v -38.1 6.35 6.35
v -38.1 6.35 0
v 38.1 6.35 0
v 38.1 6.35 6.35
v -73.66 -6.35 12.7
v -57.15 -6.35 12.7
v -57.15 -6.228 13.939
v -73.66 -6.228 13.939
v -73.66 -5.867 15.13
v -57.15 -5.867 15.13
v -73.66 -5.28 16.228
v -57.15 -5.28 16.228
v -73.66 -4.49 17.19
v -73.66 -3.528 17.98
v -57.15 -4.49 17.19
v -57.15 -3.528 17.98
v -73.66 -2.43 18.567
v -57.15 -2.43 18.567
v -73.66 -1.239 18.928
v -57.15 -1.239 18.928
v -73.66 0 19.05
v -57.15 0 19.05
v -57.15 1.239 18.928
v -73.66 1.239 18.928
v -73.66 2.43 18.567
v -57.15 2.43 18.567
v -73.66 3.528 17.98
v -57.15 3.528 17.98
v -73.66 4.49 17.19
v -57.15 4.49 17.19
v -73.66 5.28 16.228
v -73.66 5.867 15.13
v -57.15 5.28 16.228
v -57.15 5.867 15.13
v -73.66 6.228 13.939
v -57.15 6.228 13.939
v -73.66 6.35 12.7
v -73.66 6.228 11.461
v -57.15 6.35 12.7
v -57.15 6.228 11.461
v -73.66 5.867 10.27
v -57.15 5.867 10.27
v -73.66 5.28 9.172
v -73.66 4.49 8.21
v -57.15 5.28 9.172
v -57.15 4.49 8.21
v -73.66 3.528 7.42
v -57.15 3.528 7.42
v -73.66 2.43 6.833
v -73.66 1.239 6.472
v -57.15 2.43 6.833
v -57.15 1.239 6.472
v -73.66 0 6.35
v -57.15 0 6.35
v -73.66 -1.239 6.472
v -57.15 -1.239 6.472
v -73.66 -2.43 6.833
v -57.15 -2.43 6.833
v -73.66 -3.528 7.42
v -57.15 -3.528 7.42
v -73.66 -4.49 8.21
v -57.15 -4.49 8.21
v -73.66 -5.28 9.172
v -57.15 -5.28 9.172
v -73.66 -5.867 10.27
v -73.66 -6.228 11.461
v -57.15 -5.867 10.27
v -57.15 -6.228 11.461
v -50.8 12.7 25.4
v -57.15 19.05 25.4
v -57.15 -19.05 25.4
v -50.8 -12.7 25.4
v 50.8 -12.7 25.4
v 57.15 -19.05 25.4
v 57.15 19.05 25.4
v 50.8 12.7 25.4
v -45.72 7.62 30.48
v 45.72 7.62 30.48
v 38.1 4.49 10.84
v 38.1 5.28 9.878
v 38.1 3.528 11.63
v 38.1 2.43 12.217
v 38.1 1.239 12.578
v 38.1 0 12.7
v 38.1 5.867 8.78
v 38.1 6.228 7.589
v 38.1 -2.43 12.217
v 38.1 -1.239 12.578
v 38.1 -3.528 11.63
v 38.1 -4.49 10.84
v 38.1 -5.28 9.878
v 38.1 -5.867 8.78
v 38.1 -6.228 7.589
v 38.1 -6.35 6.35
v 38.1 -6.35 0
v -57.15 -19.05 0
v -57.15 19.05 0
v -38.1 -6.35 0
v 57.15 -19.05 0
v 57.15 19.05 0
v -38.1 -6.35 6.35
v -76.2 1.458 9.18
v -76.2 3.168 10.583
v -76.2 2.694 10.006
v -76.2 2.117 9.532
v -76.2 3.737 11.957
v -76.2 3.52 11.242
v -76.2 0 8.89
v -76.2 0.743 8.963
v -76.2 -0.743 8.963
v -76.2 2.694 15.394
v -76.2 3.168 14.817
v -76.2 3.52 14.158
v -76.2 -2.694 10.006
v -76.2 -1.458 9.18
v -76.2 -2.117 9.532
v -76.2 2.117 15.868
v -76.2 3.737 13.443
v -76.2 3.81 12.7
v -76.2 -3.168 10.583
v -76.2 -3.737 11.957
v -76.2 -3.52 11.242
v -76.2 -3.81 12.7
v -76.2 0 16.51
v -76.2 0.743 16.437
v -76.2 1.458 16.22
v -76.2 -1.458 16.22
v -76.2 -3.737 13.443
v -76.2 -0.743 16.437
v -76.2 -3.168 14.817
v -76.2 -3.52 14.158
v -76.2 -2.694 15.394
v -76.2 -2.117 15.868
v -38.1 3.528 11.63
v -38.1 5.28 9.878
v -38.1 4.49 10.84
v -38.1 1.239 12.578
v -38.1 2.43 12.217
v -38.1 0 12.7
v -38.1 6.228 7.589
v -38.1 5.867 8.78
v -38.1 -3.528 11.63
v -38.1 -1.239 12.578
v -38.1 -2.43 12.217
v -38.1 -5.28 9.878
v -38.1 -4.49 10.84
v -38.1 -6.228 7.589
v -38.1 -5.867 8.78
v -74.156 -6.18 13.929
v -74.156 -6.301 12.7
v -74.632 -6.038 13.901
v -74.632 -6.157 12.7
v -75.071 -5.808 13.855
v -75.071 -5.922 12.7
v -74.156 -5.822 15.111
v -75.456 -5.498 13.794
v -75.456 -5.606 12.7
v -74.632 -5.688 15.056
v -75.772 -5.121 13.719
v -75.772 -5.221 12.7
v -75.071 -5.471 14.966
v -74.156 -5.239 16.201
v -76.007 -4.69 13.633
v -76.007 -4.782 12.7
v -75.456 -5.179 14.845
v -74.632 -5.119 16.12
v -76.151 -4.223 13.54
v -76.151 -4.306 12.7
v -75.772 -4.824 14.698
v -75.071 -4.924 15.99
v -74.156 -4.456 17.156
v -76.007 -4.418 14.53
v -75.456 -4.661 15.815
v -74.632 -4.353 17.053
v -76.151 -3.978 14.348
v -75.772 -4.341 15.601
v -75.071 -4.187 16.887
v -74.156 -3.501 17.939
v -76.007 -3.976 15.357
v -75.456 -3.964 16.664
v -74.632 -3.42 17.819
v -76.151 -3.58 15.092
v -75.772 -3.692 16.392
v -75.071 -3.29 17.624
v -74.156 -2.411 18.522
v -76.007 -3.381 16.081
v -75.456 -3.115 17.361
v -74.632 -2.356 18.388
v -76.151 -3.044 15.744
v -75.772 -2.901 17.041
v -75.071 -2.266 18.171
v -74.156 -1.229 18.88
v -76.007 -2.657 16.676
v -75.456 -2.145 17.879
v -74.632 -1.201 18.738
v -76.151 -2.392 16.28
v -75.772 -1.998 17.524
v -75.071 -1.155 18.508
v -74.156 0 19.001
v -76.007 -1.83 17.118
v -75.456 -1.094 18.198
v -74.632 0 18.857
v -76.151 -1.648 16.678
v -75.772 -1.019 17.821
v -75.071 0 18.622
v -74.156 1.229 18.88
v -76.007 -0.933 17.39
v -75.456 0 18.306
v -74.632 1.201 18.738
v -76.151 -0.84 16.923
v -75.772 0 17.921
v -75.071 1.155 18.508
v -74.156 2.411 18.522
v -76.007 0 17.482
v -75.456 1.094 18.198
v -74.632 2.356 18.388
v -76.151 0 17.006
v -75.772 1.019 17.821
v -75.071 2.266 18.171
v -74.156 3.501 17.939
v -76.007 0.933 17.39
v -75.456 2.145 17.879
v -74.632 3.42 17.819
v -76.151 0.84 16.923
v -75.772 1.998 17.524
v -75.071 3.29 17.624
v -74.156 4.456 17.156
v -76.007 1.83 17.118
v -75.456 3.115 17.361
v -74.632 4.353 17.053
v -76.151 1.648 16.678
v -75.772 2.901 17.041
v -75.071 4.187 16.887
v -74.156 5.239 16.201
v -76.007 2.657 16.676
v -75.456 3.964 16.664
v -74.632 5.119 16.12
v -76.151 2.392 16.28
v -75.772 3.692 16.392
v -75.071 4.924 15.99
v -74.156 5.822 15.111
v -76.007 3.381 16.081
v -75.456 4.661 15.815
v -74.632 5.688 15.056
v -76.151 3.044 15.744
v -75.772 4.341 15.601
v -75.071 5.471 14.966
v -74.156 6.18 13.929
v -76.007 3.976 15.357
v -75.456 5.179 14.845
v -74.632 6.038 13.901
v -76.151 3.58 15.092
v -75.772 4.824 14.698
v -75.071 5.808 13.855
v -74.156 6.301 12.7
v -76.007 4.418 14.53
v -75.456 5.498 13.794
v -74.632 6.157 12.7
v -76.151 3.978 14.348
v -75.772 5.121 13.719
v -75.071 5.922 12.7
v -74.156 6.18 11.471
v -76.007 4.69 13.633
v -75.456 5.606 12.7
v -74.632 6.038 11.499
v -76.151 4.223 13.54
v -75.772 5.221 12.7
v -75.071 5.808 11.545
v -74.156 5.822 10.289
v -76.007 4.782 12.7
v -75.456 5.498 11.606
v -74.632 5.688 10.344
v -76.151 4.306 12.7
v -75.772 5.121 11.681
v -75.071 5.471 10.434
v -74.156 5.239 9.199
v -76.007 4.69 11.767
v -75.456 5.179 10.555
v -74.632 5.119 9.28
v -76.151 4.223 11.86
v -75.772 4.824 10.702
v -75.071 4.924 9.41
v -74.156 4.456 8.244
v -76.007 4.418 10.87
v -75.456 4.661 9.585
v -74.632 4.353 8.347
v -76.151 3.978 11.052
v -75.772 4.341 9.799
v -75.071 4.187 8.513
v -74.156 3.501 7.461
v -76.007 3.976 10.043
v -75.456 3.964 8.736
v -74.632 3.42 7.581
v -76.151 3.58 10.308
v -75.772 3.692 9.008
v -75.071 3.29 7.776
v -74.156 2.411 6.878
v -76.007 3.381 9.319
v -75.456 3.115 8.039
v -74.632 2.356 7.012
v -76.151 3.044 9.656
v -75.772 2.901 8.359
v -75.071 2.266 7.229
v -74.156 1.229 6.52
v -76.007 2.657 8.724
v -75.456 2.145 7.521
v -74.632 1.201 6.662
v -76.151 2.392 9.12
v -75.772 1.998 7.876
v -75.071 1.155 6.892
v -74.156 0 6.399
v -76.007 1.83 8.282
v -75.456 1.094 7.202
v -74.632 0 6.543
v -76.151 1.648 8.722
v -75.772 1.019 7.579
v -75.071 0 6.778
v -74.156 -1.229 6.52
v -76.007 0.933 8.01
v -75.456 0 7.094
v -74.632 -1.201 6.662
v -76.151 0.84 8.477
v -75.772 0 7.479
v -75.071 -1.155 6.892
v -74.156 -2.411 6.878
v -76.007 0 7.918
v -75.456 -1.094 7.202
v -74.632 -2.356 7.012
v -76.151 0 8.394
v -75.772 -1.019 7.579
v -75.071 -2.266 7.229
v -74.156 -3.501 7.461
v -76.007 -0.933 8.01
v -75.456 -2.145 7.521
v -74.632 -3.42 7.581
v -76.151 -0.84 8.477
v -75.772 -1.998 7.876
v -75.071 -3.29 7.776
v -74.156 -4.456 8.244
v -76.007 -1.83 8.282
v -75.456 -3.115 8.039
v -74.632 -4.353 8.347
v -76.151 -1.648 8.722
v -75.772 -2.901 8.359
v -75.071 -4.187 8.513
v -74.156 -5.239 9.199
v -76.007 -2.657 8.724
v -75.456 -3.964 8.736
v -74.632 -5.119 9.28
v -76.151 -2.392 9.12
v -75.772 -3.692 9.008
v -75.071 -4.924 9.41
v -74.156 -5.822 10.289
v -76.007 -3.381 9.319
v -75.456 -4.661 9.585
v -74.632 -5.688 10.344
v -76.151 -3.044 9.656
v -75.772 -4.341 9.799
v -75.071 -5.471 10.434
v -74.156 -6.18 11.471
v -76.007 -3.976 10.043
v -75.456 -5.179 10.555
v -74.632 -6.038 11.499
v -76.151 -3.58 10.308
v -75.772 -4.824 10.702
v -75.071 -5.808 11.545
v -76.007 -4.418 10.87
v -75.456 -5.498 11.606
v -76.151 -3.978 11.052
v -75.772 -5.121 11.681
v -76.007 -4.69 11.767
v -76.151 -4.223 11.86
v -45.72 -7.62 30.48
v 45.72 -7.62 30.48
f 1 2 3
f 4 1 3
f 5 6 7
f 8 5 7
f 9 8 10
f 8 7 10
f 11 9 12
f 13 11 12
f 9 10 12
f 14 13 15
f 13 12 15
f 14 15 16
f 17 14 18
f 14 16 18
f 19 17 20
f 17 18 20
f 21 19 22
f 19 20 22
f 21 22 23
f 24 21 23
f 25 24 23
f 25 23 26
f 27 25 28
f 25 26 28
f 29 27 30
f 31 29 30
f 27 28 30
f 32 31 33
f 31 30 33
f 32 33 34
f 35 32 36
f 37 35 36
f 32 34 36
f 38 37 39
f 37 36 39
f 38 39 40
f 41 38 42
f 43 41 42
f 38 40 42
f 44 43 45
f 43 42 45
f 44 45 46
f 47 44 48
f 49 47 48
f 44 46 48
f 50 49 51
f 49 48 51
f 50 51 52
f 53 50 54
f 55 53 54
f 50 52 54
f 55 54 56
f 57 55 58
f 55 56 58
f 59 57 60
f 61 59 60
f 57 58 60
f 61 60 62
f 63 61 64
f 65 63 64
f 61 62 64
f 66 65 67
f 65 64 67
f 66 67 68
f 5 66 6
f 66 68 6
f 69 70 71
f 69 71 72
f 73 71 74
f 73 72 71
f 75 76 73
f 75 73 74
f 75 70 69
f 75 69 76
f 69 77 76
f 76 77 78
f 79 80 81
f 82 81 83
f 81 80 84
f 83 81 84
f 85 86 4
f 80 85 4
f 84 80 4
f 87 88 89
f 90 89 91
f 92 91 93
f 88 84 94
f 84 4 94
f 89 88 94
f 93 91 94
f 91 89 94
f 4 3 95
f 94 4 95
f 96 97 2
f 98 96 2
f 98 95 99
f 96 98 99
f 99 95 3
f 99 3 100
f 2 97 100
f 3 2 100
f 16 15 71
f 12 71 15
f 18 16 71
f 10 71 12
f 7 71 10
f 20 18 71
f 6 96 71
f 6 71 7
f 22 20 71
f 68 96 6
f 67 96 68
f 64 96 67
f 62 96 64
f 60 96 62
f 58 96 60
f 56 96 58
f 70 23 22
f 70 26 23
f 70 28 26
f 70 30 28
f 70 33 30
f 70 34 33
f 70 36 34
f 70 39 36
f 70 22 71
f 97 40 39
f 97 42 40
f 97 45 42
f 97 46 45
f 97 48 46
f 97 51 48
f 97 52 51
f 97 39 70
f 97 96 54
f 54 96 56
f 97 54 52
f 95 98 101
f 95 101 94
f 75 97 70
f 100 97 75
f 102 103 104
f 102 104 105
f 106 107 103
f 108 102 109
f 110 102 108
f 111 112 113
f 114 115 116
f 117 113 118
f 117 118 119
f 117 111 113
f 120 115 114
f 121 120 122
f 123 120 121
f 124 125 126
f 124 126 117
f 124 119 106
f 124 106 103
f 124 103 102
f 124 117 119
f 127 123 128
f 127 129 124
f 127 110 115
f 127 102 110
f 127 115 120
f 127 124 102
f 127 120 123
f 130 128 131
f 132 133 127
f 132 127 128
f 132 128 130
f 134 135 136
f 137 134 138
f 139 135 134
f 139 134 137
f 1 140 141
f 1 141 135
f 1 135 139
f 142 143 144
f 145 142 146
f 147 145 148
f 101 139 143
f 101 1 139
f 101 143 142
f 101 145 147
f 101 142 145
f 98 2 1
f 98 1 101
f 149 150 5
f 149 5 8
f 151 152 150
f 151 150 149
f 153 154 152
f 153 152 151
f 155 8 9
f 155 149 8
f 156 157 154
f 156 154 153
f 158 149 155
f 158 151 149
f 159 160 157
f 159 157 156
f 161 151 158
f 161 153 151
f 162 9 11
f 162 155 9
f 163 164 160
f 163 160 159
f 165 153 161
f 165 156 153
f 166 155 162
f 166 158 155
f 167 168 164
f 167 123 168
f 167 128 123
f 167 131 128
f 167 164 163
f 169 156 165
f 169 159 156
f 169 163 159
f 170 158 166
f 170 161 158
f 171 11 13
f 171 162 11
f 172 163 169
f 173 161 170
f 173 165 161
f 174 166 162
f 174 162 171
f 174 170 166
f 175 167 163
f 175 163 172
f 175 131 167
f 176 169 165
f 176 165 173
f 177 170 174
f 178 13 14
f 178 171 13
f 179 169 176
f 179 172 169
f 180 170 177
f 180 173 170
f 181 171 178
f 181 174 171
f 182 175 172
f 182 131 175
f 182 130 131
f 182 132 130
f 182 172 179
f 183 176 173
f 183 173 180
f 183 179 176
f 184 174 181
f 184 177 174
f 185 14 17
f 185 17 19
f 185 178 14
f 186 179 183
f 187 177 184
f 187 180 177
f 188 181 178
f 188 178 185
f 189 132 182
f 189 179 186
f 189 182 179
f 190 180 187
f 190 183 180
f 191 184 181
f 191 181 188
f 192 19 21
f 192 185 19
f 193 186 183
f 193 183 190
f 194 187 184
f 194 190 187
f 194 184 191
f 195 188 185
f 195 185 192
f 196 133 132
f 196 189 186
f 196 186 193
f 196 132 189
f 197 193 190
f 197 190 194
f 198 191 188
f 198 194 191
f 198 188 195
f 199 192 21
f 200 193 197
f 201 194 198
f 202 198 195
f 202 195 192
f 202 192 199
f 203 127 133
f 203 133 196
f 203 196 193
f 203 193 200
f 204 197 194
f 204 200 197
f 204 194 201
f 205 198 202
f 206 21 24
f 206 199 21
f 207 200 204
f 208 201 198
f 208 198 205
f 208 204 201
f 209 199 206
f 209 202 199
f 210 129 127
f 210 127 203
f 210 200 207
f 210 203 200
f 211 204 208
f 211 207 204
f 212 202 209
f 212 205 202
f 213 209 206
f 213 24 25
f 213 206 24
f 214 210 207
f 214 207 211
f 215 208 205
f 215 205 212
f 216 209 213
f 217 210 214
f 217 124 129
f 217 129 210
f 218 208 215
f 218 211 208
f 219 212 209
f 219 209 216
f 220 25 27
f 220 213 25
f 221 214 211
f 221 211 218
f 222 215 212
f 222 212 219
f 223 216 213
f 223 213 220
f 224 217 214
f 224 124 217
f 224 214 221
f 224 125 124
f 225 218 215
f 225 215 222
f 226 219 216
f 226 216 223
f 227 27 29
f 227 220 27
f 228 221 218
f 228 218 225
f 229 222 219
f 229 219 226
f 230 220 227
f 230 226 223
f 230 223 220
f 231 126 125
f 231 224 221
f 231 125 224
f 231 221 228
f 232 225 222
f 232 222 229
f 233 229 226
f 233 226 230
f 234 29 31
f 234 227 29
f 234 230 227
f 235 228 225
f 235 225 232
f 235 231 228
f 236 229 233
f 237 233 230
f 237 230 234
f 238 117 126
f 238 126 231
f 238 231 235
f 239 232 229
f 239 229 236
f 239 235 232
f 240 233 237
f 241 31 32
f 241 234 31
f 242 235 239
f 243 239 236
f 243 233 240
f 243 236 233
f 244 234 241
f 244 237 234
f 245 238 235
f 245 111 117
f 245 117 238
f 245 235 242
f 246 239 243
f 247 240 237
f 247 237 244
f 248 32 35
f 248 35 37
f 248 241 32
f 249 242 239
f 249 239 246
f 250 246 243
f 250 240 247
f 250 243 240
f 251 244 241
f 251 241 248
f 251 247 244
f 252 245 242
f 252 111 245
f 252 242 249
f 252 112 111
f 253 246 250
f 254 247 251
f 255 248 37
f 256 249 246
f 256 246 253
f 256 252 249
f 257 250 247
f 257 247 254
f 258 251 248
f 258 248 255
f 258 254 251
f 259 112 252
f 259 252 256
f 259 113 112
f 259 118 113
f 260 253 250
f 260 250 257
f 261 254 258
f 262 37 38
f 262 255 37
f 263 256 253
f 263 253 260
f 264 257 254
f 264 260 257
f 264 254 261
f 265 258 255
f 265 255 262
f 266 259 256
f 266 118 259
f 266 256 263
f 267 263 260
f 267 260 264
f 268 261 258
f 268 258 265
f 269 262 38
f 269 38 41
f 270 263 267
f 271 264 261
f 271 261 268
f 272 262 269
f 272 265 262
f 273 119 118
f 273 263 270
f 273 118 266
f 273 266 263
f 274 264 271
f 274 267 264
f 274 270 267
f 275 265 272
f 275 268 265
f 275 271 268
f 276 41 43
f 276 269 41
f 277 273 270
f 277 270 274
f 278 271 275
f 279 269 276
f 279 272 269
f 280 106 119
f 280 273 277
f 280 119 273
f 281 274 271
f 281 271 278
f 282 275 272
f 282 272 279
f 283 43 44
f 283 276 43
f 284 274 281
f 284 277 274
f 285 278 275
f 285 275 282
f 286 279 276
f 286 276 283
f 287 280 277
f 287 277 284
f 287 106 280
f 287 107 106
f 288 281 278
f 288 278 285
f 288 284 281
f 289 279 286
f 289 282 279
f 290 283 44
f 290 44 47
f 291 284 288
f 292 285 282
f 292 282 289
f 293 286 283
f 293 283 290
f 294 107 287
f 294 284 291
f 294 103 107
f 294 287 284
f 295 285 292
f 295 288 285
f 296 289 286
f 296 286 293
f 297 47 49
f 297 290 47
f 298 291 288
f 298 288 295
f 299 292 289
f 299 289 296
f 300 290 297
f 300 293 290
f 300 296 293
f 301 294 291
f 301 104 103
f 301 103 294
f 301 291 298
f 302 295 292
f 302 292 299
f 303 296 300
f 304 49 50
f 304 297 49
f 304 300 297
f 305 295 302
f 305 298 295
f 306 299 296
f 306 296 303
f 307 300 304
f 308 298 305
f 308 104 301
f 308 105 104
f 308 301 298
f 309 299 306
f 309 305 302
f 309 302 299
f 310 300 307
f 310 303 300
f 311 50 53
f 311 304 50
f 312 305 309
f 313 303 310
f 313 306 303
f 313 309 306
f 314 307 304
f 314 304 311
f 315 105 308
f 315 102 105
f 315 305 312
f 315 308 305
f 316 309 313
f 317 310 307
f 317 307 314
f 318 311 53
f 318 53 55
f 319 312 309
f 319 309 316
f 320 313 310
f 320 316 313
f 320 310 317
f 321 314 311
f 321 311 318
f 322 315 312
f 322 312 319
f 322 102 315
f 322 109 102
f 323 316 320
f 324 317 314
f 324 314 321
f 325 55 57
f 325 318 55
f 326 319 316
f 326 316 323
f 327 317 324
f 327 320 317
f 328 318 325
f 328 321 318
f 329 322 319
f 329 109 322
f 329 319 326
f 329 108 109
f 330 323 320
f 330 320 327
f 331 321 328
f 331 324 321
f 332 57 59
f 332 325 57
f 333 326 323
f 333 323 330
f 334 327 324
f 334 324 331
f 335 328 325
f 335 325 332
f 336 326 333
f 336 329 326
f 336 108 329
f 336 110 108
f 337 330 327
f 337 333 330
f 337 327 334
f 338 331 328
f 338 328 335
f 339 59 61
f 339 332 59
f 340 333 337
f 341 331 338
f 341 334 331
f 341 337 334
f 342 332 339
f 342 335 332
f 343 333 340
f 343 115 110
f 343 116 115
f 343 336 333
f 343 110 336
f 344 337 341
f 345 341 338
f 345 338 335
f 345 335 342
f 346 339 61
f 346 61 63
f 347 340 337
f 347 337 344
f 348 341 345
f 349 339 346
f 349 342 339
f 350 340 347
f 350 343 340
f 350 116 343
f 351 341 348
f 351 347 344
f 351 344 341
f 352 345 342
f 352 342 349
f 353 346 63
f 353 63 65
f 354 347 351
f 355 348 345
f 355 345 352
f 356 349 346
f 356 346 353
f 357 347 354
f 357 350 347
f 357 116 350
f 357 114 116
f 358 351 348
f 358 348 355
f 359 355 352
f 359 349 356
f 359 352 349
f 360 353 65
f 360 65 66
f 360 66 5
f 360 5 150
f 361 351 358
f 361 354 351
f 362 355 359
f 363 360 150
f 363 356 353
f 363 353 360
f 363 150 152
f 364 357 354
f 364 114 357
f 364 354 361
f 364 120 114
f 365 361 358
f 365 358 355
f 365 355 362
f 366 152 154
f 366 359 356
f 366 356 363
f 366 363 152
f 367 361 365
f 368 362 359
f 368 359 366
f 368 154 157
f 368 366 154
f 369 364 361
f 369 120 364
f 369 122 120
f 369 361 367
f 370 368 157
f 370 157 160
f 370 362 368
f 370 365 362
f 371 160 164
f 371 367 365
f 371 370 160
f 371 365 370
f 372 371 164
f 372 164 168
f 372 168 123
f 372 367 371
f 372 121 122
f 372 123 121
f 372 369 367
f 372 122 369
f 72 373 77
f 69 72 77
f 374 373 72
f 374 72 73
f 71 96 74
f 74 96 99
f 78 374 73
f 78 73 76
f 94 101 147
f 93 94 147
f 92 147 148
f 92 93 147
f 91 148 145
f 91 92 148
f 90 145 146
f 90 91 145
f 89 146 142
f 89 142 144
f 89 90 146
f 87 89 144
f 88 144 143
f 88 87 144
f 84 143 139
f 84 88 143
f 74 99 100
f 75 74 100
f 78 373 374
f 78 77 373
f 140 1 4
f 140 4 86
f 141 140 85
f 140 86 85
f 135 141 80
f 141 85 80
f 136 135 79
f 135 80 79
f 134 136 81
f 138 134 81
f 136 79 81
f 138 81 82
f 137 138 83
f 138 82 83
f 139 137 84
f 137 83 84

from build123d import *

# Parameters (mm, degrees)
F0_W     = 114.3
F0_H     = 38.1
F1_DEPTH = 25.4
F2_R     = 6.35
F3_DEPTH = 19.05
F4_R     = 2.54
F5_W     = 101.6
F5_H     = 25.4
F6_DEPTH = 5.08
F7_SIZE  = 5.07999
F8_W     = 76.2
F8_H     = 12.7
F9_DEPTH = 12.7
F10_R    = 6.34999


# Not quite as in the source:
# - a fillet or chamfer is up to 0.001 mm smaller than in the source, because OpenCascade refuses the exact size


with BuildPart() as f1:
    # F0 (on Top) → F1 (new body)
    with BuildSketch(Plane.XY):
        Rectangle(F0_W, F0_H)
    extrude(amount=F1_DEPTH)

    # F2 (on face) → F3 (join)
    with BuildSketch(Plane(origin=(-57.15, 0, 0), x_dir=(0, -1, 0), z_dir=(-1, 0, 0))):
        with Locations((0, 12.7)):
            Circle(F2_R)
    extrude(amount=F3_DEPTH)

    # F4
    f4_edges = [f1.edges().sort_by_distance(p)[0] for p in [
        (-76.2, 6.35, 12.7),
    ]]
    fillet(f4_edges, radius=F4_R)

    # F5 (on face) → F6 (join)
    with BuildSketch(Plane.XY.offset(25.4)):
        Rectangle(F5_W, F5_H)
    extrude(amount=F6_DEPTH)

    # F7 (size 5.08 in the source; OpenCascade refuses exactly that, so slightly less here)
    f7_edges = [f1.edges().sort_by_distance(p)[0] for p in [
        (0, -12.7, 30.48),
        (-50.8, 0, 30.48),
        (50.8, 0, 30.48),
        (0, 12.7, 30.48),
    ]]
    chamfer(f7_edges, length=F7_SIZE)

    # F8 (on face) → F9 (cut)
    with BuildSketch(Plane(origin=(0, 0, 0), x_dir=(1, 0, 0), z_dir=(0, 0, -1))):
        Rectangle(F8_W, F8_H)
    extrude(amount=-F9_DEPTH, mode=Mode.SUBTRACT)

    # F10 (radius 6.35 in the source; OpenCascade refuses exactly that, so slightly less here)
    f10_edges = [f1.edges().sort_by_distance(p)[0] for p in [
        (0, 6.35, 12.7),
        (0, -6.35, 12.7),
    ]]
    fillet(f10_edges, radius=F10_R)


solid = f1.part
